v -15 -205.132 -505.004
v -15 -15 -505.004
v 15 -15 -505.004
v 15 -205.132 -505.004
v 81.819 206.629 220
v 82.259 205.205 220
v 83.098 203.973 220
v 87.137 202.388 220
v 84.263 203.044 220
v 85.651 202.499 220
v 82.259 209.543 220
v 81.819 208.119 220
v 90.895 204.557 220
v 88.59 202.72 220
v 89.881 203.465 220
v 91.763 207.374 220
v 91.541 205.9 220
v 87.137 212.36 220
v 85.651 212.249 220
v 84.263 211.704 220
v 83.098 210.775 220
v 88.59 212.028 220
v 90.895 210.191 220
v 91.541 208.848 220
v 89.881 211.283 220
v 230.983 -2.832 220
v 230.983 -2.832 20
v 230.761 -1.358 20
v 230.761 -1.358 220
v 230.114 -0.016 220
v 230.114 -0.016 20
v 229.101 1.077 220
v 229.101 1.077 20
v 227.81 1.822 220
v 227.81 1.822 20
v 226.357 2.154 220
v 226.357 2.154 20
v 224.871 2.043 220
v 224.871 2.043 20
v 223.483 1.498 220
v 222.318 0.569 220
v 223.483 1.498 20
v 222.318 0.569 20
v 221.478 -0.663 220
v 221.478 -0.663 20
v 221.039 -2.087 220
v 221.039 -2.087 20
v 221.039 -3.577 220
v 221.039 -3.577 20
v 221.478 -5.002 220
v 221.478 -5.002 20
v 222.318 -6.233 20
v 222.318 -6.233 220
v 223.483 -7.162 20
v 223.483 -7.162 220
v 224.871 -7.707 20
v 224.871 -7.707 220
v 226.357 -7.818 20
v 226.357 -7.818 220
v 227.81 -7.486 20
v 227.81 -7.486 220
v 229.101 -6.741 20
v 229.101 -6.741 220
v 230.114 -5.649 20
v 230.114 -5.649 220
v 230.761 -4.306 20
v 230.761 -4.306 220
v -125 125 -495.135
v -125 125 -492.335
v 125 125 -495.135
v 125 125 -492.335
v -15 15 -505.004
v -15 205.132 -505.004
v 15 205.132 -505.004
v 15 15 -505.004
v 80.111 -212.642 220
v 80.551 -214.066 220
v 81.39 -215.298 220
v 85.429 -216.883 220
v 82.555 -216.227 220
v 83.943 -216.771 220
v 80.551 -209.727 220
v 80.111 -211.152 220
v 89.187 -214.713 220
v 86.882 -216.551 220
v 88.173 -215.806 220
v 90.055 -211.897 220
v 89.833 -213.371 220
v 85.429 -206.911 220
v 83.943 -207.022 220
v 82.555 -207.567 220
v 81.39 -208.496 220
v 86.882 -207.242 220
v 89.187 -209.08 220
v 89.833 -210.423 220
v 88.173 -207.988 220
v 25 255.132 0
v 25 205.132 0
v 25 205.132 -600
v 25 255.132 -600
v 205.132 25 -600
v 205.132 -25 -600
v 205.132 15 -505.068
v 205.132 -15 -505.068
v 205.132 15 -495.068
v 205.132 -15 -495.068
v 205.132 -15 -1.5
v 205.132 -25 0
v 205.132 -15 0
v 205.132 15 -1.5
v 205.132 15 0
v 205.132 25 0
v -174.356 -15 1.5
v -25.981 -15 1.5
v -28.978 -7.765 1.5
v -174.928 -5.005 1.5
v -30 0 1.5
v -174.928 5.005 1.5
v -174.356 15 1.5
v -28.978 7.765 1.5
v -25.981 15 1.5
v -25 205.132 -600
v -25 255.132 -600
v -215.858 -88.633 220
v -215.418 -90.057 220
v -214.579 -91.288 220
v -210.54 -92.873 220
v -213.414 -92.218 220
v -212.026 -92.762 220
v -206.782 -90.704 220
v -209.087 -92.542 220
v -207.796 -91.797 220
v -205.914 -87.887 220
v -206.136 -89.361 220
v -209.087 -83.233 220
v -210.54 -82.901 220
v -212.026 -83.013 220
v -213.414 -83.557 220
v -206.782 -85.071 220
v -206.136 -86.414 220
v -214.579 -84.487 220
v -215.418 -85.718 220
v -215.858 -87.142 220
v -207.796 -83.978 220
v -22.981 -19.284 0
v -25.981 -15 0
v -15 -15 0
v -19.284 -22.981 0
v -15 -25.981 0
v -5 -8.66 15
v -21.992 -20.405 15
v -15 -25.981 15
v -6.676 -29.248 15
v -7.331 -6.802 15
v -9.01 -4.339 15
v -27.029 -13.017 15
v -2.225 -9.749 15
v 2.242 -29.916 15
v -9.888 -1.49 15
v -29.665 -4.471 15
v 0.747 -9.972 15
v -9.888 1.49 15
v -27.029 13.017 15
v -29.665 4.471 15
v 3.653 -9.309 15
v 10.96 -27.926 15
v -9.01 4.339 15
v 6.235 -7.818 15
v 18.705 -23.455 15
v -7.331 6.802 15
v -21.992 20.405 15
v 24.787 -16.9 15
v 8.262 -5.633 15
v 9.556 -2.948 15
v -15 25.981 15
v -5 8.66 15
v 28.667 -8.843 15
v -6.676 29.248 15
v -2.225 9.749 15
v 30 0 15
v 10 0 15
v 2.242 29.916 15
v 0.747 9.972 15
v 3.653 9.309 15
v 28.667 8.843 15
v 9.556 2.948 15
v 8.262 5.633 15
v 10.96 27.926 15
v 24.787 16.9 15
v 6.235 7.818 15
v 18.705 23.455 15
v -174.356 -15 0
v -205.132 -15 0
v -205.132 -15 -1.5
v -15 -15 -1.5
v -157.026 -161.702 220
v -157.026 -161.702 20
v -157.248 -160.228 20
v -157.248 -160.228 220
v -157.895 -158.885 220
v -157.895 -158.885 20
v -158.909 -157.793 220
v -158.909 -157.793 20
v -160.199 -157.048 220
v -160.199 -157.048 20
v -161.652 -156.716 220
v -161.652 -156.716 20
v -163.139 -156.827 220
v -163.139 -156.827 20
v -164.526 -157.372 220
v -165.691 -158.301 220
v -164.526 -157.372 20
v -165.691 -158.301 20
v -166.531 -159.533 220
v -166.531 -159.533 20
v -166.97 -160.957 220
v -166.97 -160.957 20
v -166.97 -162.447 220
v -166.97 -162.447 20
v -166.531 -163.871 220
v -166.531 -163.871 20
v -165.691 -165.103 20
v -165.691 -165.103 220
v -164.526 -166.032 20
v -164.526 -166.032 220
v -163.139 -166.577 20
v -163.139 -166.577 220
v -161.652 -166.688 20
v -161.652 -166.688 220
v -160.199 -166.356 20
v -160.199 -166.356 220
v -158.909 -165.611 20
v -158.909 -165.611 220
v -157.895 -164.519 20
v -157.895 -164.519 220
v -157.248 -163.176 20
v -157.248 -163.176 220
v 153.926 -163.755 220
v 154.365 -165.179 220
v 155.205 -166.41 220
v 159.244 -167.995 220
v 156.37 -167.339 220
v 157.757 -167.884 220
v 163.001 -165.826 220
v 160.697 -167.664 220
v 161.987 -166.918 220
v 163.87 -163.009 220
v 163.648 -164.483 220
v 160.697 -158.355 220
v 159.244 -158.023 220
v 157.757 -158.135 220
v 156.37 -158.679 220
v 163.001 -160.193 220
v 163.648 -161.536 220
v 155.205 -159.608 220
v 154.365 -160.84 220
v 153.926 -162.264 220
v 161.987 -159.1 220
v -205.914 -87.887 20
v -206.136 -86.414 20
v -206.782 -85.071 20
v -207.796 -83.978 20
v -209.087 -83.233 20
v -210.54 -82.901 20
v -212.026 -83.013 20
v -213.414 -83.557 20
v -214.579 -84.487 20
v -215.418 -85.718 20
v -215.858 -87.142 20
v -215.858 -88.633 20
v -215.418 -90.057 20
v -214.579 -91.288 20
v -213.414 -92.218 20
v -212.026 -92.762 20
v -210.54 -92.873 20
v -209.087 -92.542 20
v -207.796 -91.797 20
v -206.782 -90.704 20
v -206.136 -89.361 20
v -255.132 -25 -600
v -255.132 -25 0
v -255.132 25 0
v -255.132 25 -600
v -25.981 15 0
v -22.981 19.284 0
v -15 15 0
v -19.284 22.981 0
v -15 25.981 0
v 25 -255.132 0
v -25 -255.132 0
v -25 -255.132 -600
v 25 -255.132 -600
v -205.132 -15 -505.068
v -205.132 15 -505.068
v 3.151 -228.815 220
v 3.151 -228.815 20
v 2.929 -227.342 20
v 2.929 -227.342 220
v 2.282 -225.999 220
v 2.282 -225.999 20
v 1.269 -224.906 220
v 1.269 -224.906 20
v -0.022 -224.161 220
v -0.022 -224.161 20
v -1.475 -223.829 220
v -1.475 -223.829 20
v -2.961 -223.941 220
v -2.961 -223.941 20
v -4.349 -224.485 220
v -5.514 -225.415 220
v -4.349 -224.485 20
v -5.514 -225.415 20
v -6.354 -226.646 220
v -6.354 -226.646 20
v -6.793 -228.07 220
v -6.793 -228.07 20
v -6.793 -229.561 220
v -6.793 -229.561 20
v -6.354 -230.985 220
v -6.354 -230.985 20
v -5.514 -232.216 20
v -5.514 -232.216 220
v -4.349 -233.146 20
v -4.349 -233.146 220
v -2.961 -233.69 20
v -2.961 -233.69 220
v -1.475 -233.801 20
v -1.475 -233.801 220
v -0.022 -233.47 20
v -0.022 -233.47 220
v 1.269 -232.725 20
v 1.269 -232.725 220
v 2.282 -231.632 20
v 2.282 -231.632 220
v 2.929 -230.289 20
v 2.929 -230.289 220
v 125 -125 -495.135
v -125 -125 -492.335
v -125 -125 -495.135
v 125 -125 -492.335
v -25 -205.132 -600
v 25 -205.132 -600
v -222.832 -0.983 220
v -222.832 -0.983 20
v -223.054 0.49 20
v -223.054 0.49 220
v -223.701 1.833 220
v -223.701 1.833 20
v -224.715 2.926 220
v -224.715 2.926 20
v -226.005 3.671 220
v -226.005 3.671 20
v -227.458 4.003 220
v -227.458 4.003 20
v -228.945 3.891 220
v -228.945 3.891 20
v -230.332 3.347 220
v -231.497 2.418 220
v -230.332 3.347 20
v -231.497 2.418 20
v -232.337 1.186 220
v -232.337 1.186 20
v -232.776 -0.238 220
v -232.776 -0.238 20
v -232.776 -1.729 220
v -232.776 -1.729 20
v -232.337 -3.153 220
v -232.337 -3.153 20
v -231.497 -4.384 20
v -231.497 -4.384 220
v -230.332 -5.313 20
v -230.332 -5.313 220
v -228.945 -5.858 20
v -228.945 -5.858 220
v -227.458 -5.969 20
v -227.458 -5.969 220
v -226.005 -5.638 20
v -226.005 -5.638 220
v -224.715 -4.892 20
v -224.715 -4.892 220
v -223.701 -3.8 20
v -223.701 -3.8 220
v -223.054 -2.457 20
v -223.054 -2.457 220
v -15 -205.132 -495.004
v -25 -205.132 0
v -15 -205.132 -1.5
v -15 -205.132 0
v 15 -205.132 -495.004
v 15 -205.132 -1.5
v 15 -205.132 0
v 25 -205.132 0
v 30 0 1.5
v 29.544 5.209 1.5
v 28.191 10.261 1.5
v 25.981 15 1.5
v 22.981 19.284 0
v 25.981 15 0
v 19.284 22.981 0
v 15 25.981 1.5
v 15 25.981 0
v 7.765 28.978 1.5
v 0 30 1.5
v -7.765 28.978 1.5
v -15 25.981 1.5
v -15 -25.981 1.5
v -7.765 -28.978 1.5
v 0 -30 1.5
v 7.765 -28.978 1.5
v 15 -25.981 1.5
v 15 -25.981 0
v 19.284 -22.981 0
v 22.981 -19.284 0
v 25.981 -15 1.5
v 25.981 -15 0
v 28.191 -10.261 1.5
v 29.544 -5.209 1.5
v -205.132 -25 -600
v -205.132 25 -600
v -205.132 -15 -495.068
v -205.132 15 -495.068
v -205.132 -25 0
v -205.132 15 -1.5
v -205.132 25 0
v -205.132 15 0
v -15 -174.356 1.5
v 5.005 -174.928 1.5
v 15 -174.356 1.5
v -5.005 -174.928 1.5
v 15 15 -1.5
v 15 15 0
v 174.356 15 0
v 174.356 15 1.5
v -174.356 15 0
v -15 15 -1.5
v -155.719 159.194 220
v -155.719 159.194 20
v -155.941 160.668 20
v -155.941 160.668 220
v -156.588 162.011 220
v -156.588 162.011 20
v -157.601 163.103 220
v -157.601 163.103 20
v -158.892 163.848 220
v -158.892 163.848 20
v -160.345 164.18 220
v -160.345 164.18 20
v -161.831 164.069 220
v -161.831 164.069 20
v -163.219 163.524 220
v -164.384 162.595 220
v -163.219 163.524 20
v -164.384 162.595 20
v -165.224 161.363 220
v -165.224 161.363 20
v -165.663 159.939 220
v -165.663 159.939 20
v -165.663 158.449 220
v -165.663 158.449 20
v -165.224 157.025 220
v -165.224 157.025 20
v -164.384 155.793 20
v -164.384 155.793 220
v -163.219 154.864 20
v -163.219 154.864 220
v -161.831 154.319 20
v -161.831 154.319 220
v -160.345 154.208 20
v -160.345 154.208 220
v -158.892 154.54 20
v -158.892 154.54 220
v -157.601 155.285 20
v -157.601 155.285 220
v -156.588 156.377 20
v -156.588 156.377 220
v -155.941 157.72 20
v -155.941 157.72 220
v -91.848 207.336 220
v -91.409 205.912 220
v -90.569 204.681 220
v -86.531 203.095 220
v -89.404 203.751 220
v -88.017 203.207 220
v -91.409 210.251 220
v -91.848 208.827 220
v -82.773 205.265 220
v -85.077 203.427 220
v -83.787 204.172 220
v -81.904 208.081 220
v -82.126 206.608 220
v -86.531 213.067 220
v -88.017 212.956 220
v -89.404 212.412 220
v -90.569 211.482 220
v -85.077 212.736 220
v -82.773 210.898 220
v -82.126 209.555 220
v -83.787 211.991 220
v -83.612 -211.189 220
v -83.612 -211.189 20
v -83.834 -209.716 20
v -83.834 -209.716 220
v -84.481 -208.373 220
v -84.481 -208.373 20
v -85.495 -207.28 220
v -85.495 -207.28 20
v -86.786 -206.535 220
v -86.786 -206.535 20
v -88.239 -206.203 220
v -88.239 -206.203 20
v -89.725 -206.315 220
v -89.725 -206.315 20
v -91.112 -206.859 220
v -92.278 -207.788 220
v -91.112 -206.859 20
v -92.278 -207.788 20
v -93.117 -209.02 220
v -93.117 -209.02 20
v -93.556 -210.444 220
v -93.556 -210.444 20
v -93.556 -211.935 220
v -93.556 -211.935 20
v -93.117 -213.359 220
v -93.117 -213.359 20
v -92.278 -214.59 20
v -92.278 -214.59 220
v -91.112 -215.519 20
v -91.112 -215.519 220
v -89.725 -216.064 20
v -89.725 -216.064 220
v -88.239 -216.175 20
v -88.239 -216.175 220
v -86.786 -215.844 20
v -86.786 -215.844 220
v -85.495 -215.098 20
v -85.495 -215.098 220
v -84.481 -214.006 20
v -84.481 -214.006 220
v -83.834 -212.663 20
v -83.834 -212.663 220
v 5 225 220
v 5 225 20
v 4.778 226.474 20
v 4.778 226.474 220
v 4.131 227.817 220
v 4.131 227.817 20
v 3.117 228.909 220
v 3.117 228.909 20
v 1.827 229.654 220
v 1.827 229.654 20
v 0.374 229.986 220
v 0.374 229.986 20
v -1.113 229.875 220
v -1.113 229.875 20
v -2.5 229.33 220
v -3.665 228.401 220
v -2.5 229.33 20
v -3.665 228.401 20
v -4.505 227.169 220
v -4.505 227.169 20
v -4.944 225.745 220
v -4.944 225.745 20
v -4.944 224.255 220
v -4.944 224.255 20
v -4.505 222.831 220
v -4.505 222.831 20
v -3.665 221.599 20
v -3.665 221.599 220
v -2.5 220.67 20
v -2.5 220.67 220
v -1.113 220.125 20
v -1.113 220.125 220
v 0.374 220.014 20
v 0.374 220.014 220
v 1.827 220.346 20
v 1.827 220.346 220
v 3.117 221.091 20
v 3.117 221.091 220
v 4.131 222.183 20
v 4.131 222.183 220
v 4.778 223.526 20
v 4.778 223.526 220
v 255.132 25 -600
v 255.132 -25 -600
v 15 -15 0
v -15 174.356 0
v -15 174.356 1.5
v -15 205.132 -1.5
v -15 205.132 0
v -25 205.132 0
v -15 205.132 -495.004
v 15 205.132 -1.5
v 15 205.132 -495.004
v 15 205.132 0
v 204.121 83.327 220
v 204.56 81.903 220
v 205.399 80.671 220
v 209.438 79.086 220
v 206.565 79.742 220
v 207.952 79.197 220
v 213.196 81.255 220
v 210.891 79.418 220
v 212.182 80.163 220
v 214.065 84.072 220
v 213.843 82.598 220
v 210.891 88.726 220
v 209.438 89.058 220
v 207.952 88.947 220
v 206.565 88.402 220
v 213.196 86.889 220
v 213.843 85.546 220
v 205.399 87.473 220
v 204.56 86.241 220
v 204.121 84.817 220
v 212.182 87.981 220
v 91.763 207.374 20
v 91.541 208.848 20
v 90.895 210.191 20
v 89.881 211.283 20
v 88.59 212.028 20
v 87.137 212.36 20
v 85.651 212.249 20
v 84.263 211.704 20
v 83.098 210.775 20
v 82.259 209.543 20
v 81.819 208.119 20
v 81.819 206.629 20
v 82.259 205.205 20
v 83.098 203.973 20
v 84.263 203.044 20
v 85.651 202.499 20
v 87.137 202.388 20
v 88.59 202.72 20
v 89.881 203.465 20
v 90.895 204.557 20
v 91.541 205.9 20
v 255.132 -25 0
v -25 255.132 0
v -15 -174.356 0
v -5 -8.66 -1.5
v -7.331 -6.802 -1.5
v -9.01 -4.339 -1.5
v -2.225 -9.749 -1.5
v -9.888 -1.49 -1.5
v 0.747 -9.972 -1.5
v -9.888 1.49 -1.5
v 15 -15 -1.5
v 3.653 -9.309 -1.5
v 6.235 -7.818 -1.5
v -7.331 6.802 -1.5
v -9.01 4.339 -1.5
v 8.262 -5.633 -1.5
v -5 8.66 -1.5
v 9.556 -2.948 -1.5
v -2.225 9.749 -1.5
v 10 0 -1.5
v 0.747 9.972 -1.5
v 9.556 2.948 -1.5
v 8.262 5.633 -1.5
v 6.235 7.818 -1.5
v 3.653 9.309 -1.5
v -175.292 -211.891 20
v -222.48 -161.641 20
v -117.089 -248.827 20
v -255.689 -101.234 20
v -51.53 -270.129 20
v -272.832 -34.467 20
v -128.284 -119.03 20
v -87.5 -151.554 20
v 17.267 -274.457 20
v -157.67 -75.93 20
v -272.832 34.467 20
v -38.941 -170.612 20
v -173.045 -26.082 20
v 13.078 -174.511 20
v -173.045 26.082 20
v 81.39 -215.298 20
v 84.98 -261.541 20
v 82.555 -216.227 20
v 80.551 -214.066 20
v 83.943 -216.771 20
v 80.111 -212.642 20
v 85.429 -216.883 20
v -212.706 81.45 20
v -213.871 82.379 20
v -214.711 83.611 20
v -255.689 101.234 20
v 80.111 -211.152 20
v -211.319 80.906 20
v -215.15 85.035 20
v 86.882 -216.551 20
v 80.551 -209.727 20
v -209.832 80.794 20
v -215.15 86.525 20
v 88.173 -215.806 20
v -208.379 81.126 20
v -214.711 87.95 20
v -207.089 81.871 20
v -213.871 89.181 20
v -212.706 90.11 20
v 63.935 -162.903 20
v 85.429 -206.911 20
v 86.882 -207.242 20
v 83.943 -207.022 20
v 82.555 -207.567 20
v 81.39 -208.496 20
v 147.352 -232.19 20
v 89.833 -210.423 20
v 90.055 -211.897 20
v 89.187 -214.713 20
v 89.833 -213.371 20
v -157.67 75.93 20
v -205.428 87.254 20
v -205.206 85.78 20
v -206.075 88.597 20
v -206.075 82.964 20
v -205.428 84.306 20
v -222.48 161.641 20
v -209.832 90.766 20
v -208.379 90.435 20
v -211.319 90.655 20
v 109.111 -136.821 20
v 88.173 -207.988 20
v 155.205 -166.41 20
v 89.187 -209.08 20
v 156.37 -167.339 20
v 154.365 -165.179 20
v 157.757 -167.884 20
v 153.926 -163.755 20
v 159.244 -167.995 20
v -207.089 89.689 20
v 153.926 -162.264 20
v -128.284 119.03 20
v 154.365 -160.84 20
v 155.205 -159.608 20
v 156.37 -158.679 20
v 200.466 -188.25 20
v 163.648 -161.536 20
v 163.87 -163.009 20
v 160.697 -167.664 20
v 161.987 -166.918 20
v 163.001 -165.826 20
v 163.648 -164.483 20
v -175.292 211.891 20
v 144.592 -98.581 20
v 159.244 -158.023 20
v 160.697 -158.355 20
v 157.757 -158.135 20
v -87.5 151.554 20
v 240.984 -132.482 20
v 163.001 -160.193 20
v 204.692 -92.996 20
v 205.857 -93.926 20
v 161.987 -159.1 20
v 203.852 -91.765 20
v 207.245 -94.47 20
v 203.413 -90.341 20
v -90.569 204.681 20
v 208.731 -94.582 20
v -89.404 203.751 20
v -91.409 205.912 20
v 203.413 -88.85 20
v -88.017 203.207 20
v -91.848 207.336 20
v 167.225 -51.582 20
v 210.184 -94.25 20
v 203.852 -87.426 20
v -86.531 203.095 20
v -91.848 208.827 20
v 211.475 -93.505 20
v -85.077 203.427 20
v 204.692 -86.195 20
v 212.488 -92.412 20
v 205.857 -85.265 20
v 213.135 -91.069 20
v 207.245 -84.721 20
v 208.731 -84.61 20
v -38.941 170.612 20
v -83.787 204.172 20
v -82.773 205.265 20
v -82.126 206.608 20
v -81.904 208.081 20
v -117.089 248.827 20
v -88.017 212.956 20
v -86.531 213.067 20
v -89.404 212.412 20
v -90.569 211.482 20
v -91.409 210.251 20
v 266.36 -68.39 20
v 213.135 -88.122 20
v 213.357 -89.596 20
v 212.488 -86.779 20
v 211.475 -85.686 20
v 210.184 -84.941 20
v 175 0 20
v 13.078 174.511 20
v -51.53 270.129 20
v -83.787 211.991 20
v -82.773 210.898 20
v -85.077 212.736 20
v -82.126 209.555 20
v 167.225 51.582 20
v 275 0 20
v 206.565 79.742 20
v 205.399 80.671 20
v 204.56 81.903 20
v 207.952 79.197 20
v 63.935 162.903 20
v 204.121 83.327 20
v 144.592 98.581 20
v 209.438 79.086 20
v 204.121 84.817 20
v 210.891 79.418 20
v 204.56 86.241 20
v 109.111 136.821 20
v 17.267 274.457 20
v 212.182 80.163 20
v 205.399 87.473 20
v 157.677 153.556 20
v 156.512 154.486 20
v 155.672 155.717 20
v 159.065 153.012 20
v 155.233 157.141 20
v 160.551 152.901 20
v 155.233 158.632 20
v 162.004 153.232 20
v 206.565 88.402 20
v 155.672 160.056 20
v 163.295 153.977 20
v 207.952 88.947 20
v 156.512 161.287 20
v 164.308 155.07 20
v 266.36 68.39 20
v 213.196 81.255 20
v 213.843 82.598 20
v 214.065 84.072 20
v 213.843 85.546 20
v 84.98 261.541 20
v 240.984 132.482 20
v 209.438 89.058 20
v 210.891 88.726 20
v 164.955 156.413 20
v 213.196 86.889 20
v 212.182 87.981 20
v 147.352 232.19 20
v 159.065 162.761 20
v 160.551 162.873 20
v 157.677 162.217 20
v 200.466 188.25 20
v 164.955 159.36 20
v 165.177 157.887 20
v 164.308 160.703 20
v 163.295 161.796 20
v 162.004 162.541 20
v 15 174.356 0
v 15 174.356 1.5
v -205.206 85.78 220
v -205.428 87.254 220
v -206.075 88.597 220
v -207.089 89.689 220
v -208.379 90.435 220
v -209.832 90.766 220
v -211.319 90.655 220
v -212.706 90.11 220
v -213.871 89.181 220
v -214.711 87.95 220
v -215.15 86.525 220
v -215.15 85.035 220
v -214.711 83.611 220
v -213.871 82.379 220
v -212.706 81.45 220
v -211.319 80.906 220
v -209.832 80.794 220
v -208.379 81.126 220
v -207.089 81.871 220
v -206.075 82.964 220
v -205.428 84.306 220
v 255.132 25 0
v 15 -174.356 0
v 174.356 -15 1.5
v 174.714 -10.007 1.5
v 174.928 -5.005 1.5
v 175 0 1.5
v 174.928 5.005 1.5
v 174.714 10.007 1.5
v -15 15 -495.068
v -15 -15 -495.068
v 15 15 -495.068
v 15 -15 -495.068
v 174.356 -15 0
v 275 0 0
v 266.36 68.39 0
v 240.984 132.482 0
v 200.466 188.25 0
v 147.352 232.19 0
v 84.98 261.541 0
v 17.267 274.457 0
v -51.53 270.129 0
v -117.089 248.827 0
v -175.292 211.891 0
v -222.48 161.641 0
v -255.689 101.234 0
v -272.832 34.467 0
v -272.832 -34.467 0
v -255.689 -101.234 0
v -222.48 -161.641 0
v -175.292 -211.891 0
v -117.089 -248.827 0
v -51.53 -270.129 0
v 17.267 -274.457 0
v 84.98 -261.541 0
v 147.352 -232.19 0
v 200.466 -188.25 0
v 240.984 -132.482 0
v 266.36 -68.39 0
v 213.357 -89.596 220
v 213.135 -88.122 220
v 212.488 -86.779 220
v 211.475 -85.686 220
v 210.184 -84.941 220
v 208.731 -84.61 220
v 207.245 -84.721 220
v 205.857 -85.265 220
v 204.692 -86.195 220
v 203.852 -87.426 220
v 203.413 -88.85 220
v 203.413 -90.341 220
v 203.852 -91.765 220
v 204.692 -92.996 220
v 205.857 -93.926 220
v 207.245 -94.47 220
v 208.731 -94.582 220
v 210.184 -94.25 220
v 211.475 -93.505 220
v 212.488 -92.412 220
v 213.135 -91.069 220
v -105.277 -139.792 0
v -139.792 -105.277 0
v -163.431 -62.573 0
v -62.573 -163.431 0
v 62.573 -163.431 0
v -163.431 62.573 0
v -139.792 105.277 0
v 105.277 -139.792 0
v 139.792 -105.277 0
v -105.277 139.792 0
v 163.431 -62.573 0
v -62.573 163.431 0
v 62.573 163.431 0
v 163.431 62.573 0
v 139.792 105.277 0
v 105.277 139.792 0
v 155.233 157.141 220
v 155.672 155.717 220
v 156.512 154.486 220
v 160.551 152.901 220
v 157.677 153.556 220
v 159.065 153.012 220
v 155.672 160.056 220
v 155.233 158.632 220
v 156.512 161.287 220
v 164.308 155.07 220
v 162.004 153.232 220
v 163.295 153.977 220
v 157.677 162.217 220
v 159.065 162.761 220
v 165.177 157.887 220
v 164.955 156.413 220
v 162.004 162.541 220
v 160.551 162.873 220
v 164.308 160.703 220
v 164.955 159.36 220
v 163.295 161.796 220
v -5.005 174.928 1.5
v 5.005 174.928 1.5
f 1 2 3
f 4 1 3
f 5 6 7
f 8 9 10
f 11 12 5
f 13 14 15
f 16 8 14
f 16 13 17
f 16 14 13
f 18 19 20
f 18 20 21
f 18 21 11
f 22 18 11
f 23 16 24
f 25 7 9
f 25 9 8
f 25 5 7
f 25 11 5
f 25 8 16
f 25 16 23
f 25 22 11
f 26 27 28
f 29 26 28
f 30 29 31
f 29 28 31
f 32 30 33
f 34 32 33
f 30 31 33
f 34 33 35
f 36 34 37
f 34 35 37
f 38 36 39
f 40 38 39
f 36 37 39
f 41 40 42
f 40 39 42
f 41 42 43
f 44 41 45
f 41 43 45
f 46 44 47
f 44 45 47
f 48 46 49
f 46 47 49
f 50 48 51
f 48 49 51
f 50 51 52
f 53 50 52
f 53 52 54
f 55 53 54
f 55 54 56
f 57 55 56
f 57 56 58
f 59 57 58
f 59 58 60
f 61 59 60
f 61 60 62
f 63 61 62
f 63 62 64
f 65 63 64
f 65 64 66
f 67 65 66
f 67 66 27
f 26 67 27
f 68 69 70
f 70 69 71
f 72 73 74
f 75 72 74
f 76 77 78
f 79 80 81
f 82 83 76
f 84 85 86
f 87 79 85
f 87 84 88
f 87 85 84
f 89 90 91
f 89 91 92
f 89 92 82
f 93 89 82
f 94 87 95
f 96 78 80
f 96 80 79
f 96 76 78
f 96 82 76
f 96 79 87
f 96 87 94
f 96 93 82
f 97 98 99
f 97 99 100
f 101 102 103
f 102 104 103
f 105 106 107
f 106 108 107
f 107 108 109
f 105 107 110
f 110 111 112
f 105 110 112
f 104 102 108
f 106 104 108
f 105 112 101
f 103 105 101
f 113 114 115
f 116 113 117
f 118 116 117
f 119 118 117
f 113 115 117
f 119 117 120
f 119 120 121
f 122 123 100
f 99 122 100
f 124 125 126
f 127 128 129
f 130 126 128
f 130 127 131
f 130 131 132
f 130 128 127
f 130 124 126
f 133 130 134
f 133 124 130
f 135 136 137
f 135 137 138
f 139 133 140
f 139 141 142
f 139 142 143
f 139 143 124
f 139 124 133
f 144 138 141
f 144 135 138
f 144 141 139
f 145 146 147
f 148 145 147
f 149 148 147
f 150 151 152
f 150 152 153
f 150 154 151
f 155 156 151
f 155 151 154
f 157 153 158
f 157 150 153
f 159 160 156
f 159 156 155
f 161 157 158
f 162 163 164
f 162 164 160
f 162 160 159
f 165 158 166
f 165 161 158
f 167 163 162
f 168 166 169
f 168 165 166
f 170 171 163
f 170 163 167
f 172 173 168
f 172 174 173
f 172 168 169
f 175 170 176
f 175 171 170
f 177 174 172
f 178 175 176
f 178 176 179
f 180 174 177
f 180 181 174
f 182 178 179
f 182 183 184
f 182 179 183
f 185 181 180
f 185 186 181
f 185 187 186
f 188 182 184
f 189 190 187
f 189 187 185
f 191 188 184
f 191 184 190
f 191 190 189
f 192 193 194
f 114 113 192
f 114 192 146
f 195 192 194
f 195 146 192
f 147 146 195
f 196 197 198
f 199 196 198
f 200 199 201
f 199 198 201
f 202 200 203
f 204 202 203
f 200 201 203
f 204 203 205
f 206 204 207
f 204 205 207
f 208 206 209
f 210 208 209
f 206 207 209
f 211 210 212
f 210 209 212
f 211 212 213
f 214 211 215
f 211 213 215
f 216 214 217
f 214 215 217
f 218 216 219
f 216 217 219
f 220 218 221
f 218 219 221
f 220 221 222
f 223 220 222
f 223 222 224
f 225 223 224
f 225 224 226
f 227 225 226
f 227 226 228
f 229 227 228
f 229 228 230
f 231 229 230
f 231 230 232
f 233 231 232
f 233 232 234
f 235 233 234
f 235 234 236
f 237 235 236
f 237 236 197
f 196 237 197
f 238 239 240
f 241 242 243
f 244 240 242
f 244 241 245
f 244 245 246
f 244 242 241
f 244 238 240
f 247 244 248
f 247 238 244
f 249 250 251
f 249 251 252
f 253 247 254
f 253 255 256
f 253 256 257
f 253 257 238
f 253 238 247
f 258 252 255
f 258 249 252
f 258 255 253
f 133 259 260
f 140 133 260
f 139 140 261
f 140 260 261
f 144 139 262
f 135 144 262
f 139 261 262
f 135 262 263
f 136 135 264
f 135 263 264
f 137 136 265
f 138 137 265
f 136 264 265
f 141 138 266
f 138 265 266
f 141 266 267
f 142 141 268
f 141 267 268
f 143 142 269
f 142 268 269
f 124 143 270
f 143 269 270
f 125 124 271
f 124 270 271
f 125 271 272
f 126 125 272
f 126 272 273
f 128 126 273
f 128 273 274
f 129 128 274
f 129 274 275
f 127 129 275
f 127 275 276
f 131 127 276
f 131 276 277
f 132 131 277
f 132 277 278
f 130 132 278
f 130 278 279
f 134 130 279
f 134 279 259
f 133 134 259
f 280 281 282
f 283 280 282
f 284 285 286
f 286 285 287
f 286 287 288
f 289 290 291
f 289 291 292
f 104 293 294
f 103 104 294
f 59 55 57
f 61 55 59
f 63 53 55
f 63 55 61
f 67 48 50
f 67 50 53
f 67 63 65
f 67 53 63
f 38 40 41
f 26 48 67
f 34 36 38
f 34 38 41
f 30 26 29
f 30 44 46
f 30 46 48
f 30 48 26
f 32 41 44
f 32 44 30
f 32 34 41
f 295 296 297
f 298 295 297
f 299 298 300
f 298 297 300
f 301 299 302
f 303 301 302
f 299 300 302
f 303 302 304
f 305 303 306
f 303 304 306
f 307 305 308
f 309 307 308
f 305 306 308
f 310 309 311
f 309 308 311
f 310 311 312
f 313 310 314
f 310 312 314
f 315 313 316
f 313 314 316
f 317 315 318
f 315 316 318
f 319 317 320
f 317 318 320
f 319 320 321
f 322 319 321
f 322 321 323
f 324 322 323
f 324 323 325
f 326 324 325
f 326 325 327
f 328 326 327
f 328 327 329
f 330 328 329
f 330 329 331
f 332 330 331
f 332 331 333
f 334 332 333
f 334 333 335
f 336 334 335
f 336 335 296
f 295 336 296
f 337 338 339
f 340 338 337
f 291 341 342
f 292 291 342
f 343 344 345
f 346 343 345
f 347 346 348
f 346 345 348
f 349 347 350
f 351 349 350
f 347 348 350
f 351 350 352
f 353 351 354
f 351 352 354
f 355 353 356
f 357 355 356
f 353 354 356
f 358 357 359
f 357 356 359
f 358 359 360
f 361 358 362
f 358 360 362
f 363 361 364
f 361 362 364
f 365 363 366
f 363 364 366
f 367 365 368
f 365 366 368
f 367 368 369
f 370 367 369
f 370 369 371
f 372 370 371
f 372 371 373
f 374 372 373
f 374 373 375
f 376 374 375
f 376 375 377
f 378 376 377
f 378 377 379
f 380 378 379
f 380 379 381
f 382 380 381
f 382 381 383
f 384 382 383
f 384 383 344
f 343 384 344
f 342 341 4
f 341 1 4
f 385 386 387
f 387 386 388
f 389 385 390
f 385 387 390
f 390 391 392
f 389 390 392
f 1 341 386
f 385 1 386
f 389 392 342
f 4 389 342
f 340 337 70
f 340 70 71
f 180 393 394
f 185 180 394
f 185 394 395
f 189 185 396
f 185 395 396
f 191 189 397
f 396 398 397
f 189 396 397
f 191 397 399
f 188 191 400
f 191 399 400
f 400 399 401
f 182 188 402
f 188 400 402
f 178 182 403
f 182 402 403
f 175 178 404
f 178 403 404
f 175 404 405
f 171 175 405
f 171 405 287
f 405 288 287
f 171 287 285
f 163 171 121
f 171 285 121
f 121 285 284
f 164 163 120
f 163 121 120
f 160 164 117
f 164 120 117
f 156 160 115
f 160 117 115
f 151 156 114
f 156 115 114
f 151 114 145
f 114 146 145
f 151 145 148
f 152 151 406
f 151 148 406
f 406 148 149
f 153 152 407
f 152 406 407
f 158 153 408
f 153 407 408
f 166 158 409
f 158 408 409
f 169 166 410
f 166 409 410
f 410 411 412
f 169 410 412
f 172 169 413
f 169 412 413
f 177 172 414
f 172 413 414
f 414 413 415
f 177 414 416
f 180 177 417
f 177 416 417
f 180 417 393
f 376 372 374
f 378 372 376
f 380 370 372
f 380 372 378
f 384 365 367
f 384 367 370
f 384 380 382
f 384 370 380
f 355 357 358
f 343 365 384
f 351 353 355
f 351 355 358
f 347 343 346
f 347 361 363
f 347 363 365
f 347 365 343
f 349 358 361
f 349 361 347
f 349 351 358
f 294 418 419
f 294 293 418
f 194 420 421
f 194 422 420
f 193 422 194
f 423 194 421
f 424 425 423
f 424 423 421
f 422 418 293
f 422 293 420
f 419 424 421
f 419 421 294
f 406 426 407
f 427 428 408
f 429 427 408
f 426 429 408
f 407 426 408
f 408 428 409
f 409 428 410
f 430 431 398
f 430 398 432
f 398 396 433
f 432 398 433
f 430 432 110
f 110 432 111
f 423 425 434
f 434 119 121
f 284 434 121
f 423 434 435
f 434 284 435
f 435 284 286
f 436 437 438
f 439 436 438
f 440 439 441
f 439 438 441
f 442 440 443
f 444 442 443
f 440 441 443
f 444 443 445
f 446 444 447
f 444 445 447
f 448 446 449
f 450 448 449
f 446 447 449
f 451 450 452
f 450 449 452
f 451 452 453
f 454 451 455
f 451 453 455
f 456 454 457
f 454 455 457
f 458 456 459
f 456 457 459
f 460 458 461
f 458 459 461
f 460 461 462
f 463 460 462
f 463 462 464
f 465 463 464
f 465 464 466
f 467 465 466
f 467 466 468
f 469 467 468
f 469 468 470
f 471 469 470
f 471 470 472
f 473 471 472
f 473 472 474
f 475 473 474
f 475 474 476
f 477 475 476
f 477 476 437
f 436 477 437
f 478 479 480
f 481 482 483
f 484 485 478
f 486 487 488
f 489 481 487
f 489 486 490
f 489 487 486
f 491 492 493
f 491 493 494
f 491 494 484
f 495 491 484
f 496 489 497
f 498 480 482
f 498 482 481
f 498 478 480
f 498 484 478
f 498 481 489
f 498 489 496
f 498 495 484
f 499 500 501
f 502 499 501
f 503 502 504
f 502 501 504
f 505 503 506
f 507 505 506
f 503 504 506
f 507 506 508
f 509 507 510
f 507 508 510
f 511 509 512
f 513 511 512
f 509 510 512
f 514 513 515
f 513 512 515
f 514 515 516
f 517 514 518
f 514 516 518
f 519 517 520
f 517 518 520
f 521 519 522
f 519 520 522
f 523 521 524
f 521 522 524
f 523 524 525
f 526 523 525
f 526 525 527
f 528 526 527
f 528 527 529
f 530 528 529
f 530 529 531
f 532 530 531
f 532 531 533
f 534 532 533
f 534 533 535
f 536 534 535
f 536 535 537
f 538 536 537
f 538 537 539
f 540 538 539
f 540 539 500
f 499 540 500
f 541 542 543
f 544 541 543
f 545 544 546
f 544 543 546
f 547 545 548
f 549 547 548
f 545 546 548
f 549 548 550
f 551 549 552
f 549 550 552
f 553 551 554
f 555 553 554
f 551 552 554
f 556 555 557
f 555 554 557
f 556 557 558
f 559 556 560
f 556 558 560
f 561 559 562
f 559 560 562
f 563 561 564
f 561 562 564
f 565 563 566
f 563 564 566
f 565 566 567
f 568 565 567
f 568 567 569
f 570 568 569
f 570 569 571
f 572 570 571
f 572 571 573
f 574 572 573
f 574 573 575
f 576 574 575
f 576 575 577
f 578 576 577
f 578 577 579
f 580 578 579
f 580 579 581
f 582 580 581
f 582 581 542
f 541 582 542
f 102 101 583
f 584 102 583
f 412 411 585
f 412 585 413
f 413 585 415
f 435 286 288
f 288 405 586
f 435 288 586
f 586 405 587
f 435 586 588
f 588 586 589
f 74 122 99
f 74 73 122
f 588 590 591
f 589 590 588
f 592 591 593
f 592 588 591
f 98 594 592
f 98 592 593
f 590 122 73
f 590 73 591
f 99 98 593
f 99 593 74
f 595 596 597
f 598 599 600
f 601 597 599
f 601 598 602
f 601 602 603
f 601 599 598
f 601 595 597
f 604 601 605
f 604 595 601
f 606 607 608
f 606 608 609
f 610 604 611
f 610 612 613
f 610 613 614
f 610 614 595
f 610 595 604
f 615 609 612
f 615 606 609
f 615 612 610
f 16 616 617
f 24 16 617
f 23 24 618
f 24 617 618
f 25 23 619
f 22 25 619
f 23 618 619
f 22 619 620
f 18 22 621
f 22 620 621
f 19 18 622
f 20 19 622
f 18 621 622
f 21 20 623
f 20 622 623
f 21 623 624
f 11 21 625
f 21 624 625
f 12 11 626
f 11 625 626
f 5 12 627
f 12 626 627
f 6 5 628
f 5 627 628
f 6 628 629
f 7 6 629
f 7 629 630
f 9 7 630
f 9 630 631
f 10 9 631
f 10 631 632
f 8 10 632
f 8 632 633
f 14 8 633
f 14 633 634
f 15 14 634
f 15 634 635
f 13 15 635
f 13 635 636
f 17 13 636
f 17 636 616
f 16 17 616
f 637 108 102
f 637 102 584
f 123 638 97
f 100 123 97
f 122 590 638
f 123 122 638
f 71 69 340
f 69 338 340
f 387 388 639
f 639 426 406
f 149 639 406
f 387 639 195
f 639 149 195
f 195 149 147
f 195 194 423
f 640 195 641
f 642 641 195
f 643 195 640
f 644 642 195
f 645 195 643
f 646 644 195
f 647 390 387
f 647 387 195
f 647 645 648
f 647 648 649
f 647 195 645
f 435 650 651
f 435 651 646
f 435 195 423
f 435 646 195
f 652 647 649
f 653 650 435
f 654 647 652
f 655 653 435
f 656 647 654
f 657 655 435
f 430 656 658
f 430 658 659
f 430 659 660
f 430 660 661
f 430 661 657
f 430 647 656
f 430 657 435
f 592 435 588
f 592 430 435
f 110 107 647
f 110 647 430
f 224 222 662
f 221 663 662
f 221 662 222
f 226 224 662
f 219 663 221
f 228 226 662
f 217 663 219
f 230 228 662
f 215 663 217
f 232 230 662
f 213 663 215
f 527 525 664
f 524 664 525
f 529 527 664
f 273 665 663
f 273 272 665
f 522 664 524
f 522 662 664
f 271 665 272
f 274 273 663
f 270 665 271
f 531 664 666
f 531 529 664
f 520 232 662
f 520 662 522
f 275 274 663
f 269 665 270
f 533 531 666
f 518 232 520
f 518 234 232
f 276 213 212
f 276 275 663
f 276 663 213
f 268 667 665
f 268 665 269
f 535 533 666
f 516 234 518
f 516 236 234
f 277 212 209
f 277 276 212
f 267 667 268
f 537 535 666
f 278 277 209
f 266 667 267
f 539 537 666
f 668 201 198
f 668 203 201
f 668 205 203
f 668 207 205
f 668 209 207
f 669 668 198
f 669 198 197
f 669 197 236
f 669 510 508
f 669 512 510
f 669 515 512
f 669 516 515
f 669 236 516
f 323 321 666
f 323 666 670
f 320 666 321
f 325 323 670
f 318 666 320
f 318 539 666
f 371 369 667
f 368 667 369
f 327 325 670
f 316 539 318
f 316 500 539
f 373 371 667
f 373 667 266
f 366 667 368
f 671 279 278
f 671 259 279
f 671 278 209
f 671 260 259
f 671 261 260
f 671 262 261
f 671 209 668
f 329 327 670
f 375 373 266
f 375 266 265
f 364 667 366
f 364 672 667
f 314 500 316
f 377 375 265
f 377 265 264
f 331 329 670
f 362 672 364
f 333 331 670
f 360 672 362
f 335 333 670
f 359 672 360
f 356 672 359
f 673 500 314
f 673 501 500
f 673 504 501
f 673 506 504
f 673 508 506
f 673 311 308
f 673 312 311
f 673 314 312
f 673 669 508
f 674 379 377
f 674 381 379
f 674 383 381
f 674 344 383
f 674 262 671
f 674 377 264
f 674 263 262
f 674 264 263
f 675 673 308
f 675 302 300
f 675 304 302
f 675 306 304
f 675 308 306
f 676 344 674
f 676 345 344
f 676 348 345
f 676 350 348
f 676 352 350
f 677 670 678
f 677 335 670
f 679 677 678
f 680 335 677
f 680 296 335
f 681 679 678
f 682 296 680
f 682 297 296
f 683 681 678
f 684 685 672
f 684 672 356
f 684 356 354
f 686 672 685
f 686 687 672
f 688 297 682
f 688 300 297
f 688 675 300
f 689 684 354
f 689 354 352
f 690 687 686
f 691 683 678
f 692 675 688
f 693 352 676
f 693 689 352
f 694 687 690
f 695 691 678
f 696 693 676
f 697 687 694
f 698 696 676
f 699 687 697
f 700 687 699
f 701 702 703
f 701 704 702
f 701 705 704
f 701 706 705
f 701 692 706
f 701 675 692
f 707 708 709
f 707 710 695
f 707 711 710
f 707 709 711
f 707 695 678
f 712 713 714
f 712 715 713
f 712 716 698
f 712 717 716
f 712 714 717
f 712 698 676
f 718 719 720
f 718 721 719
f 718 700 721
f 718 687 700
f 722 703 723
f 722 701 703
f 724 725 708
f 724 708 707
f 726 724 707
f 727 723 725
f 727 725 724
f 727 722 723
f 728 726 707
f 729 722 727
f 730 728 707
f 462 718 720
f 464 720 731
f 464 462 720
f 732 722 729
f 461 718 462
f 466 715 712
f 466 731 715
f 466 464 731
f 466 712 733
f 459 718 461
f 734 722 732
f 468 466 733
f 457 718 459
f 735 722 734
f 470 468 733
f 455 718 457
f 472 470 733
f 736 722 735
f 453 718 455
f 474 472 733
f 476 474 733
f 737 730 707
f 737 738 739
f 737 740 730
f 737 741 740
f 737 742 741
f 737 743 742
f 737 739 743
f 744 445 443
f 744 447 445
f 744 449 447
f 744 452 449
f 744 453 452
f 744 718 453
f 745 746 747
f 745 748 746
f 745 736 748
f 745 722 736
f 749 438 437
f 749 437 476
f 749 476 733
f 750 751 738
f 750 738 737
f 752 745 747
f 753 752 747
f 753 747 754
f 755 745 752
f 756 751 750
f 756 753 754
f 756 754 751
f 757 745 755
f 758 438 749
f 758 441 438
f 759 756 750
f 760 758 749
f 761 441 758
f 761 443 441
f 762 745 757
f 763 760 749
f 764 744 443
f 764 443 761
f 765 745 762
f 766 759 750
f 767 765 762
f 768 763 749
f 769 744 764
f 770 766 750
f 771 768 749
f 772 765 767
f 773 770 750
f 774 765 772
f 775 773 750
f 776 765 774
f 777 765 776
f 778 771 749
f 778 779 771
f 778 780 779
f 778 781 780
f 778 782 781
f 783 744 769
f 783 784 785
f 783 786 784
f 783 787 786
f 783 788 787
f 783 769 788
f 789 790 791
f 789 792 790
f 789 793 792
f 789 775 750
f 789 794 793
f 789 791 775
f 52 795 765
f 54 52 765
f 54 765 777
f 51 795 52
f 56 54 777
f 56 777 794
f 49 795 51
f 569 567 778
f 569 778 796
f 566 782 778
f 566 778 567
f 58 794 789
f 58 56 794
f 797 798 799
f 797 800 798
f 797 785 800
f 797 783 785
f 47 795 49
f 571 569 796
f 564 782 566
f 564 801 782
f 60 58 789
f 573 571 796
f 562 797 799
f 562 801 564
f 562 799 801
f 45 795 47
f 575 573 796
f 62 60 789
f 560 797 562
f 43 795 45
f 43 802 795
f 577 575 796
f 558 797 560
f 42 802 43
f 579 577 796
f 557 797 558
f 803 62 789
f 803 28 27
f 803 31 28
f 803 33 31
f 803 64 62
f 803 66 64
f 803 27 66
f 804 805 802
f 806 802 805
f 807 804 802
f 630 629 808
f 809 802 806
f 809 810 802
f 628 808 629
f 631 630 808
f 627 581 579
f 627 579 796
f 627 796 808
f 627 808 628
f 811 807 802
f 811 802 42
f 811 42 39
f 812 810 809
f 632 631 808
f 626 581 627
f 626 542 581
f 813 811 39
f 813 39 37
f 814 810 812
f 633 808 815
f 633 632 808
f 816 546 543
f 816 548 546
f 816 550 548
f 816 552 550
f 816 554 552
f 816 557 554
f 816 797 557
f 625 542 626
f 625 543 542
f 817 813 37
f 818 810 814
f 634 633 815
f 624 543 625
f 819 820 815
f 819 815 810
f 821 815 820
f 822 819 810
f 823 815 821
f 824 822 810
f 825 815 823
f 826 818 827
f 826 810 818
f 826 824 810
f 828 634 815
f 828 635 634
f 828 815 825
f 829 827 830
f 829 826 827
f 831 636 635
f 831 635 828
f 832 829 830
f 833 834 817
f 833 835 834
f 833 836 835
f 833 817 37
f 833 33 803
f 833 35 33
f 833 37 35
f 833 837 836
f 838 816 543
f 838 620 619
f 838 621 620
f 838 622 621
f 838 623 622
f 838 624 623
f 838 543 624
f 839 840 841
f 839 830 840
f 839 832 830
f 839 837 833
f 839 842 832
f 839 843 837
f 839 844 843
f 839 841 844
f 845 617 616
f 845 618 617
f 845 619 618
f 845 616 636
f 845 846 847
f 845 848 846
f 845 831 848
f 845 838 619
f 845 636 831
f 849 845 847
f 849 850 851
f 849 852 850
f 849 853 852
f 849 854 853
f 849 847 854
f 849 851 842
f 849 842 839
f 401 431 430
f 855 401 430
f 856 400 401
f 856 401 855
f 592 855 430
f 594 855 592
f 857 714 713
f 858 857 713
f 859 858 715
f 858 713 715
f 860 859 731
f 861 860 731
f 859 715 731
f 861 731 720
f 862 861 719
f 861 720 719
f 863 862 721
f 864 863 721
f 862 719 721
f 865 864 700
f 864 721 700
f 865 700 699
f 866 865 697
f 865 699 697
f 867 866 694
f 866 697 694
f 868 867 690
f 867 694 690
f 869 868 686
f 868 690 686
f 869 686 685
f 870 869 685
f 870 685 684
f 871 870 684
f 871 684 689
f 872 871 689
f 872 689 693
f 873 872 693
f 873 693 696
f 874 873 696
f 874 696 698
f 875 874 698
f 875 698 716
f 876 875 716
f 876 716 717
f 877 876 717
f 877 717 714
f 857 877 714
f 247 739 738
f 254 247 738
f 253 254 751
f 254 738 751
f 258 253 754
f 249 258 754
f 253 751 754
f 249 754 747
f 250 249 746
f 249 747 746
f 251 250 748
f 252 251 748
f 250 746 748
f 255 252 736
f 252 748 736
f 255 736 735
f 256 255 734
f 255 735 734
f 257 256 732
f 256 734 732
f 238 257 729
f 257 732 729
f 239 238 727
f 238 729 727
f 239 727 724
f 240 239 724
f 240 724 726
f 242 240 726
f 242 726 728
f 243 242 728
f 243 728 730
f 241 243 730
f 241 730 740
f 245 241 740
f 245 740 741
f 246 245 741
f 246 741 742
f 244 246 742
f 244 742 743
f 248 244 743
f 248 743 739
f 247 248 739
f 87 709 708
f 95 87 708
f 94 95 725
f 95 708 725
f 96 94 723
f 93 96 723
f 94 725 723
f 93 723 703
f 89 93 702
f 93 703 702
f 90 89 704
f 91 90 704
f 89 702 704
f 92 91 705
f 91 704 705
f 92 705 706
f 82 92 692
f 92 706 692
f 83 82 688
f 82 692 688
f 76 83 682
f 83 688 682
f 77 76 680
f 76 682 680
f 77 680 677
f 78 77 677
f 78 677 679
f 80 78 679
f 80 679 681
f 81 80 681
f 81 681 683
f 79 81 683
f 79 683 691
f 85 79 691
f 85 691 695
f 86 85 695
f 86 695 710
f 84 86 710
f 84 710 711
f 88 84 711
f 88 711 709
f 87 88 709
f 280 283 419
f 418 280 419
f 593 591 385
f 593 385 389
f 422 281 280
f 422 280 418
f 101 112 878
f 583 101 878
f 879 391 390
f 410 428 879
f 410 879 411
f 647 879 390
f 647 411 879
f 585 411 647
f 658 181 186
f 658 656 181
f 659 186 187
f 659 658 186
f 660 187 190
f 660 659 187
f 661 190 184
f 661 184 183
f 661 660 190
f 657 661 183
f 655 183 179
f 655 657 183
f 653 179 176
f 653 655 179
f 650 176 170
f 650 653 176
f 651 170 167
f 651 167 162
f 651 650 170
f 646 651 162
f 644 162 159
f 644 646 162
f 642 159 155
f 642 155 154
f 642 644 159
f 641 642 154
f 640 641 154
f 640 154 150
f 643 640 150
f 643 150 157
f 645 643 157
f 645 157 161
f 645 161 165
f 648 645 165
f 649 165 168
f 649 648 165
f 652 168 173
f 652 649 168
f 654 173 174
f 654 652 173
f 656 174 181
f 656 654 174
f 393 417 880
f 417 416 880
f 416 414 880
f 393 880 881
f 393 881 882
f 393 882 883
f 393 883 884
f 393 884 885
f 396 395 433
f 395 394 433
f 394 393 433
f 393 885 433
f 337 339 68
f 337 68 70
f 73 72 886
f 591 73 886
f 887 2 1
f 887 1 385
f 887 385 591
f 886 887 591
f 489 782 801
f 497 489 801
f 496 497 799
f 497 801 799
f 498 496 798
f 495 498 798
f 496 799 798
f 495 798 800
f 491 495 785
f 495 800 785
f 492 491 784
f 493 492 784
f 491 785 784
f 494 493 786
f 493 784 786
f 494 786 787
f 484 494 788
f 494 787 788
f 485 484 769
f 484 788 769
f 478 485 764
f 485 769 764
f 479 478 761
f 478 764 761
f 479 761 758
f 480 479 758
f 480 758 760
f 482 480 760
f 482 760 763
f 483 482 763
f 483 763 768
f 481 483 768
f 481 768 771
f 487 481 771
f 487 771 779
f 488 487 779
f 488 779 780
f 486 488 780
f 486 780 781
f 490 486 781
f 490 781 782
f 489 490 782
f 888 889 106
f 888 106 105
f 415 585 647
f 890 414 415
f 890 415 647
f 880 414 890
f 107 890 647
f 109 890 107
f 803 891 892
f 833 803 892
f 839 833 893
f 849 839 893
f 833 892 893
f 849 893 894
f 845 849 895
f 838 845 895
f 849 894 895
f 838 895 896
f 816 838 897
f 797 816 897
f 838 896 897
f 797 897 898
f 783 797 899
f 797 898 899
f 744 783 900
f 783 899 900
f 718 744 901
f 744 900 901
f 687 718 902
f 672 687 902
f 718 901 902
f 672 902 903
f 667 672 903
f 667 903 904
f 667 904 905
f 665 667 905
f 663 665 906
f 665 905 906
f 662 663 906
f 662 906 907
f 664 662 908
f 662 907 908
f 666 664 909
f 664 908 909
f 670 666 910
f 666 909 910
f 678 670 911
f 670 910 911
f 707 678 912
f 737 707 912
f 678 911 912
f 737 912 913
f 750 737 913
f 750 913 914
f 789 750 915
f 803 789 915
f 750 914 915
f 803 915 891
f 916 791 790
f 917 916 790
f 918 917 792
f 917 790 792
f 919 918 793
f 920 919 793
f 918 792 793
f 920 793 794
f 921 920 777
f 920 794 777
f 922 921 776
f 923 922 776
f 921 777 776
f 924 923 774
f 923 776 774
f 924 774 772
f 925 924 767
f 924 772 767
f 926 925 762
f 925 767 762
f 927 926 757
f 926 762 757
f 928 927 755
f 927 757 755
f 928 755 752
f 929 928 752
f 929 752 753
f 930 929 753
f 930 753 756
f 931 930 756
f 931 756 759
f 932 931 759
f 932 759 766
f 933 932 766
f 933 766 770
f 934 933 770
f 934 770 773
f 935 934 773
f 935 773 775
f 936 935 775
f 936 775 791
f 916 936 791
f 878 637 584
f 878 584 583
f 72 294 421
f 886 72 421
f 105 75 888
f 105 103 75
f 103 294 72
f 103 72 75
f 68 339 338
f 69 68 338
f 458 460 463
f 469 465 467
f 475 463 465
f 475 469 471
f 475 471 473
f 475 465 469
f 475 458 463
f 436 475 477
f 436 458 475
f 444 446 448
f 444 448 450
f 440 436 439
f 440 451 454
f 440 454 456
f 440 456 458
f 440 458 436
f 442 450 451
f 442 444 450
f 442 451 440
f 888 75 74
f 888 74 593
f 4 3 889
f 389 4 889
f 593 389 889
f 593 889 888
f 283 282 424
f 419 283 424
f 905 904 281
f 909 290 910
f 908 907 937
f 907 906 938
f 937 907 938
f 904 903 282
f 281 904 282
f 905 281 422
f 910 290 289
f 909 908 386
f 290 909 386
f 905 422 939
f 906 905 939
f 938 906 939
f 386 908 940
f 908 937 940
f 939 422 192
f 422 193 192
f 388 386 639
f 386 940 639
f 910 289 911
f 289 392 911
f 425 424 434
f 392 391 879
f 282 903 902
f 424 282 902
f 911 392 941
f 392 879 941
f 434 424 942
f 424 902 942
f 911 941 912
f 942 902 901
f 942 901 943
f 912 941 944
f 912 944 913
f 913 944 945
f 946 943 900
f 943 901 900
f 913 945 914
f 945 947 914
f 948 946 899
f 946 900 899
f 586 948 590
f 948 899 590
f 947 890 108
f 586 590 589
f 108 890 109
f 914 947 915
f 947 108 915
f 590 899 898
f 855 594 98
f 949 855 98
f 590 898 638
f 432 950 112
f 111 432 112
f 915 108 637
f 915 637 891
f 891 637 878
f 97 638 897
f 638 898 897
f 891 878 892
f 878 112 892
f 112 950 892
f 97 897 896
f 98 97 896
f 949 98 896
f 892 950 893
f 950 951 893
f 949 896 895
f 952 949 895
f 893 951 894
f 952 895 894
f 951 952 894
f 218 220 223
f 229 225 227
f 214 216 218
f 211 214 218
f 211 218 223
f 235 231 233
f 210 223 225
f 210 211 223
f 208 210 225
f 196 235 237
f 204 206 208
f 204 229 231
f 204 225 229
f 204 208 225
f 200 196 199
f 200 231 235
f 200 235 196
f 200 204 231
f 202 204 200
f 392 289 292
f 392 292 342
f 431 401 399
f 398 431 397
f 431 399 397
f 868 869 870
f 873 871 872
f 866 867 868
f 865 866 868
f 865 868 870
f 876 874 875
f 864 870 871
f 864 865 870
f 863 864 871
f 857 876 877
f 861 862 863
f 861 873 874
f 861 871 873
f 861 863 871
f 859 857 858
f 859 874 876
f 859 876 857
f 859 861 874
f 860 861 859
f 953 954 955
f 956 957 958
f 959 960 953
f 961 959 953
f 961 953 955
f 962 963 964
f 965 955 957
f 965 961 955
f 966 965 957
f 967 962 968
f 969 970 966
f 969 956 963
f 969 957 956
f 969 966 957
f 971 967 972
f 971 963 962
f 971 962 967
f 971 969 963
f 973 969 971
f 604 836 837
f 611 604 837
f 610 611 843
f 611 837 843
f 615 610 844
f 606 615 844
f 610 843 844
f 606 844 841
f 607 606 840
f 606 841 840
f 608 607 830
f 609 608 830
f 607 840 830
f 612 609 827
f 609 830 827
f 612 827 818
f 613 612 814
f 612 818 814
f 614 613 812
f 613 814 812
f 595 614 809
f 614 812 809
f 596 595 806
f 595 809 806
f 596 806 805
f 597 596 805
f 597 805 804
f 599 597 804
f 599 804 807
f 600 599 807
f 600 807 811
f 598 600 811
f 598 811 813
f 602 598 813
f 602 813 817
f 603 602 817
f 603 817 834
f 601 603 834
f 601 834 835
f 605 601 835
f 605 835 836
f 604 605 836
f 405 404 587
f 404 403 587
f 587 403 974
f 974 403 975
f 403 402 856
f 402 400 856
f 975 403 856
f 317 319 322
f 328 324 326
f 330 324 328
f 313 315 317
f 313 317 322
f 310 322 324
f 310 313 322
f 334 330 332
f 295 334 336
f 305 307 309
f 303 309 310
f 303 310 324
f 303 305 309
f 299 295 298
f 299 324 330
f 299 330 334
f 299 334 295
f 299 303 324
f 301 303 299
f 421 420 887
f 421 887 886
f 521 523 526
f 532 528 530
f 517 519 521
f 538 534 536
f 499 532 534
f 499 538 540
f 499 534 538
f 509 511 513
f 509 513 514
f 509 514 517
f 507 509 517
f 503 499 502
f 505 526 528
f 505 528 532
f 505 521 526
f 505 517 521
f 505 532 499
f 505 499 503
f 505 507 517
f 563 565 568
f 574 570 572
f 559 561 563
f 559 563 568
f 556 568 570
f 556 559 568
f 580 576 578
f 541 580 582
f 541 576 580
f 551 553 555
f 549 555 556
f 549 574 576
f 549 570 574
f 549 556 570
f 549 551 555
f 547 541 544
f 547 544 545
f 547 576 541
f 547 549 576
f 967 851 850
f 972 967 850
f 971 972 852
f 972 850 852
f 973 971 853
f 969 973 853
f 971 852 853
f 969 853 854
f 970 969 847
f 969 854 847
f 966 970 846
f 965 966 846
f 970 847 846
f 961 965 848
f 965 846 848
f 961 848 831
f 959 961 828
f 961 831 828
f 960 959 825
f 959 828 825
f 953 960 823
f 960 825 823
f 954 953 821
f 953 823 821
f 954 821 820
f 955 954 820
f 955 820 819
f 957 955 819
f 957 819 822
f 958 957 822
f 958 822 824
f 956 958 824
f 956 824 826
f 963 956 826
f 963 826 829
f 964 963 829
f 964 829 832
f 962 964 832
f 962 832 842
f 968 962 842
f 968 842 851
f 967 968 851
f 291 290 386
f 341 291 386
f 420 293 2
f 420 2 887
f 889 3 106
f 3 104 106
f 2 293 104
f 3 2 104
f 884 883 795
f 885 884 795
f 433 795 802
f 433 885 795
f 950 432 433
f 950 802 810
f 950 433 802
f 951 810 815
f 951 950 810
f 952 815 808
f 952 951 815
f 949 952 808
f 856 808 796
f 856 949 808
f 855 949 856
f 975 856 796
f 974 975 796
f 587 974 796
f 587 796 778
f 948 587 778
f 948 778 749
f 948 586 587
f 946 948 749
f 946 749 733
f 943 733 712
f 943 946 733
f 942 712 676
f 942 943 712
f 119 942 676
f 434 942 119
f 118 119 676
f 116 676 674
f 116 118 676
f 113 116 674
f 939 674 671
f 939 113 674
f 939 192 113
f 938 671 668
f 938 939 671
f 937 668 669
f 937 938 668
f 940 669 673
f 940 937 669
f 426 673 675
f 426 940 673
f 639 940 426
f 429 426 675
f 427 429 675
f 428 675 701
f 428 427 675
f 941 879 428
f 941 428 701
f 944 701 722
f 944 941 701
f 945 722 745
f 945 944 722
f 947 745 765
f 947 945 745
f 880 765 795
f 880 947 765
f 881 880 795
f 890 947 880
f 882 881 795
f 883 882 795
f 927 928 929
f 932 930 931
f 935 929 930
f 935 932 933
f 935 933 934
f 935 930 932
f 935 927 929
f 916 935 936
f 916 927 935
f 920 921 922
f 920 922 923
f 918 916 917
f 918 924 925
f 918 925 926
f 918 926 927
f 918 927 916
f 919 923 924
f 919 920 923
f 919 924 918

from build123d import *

# Parameters (mm, degrees)
F0_R       = 5
F0_R_2     = 275
F0_R_3     = 175
F1_DEPTH   = 20
F2_DEPTH   = 220
F3_W       = 50
F3_H       = 50
F4_DEPTH   = 600
F5_W       = 30
F5_H       = 10
F6_DEPTH   = 220
F7_W       = 30
F7_H       = 10
F8_DEPTH   = 220
F9_W       = 250
F9_H       = 2.8
F10_DEPTH  = 125
F11_W      = 440
F11_H      = 3
F12_DEPTH  = 15
F13_W      = 440
F13_H      = 3
F14_DEPTH  = 15
F15_R      = 30
F15_R_2    = 10
F16_DEPTH  = 15
F16_FACE_R = 10
F17_DEPTH  = 125


with BuildPart() as f1:
    # F0 (on Top) → F1 (new body)
    with BuildSketch(Plane.XY):
        with Locations((85.055368, -211.896841)):
            Circle(F0_R)
        with Locations((-1.848817, -228.815405)):
            Circle(F0_R)
        with Locations((-88.612269, -211.189329)):
            Circle(F0_R)
        with Locations((-162.026039, -161.702022)):
            Circle(F0_R)
        with Locations((-210.913547, -87.887479)):
            Circle(F0_R)
        with Locations((-227.832111, -0.983294)):
            Circle(F0_R)
        with Locations((-210.206035, 85.780158)):
            Circle(F0_R)
        with Locations((-160.718728, 159.193928)):
            Circle(F0_R)
        with Locations((-86.904185, 208.081435)):
            Circle(F0_R)
        with Locations((0, 225)):
            Circle(F0_R)
        with Locations((86.763452, 207.373924)):
            Circle(F0_R)
        with Locations((160.177222, 157.886617)):
            Circle(F0_R)
        with Locations((209.06473, 84.072074)):
            Circle(F0_R)
        with Locations((225.983294, -2.832111)):
            Circle(F0_R)
        with Locations((208.357218, -89.595563)):
            Circle(F0_R)
        with Locations((158.869911, -163.009334)):
            Circle(F0_R)
        Circle(F0_R_2)
        with Locations((-162.026039, -161.702022)):
            Circle(F0_R, mode=Mode.SUBTRACT)
        with Locations((-88.612269, -211.189329)):
            Circle(F0_R, mode=Mode.SUBTRACT)
        with Locations((-1.848817, -228.815405)):
            Circle(F0_R, mode=Mode.SUBTRACT)
        with Locations((-210.913547, -87.887479)):
            Circle(F0_R, mode=Mode.SUBTRACT)
        with Locations((-227.832111, -0.983294)):
            Circle(F0_R, mode=Mode.SUBTRACT)
        with Locations((85.055368, -211.896841)):
            Circle(F0_R, mode=Mode.SUBTRACT)
        with Locations((158.869911, -163.009334)):
            Circle(F0_R, mode=Mode.SUBTRACT)
        with Locations((208.357218, -89.595563)):
            Circle(F0_R, mode=Mode.SUBTRACT)
        with Locations((225.983294, -2.832111)):
            Circle(F0_R, mode=Mode.SUBTRACT)
        with Locations((-210.206035, 85.780158)):
            Circle(F0_R, mode=Mode.SUBTRACT)
        with Locations((-160.718728, 159.193928)):
            Circle(F0_R, mode=Mode.SUBTRACT)
        with Locations((-86.904185, 208.081435)):
            Circle(F0_R, mode=Mode.SUBTRACT)
        Circle(F0_R_3, mode=Mode.SUBTRACT)
        with Locations((209.06473, 84.072074)):
            Circle(F0_R, mode=Mode.SUBTRACT)
        with Locations((0, 225)):
            Circle(F0_R, mode=Mode.SUBTRACT)
        with Locations((86.763452, 207.373924)):
            Circle(F0_R, mode=Mode.SUBTRACT)
        with Locations((160.177222, 157.886617)):
            Circle(F0_R, mode=Mode.SUBTRACT)
    extrude(amount=F1_DEPTH)

    # F0 (on Top) → F2 (join)
    with BuildSketch(Plane.XY):
        with Locations((-160.718728, 159.193928)):
            Circle(F0_R)
        with Locations((-210.206035, 85.780158)):
            Circle(F0_R)
        with Locations((-86.904185, 208.081435)):
            Circle(F0_R)
        with Locations((0, 225)):
            Circle(F0_R)
        with Locations((86.763452, 207.373924)):
            Circle(F0_R)
        with Locations((160.177222, 157.886617)):
            Circle(F0_R)
        with Locations((209.06473, 84.072074)):
            Circle(F0_R)
        with Locations((225.983294, -2.832111)):
            Circle(F0_R)
        with Locations((208.357218, -89.595563)):
            Circle(F0_R)
        with Locations((158.869911, -163.009334)):
            Circle(F0_R)
        with Locations((85.055368, -211.896841)):
            Circle(F0_R)
        with Locations((-88.612269, -211.189329)):
            Circle(F0_R)
        with Locations((-1.848817, -228.815405)):
            Circle(F0_R)
        with Locations((-162.026039, -161.702022)):
            Circle(F0_R)
        with Locations((-210.913547, -87.887479)):
            Circle(F0_R)
        with Locations((-227.832111, -0.983294)):
            Circle(F0_R)
    extrude(amount=F2_DEPTH)

    # F3 (on Top) → F4 (join)
    with BuildSketch(Plane.XY):
        with Locations((0, -230.131581)):
            Rectangle(F3_W, F3_H)
        with Locations((230.131581, 0)):
            Rectangle(F3_W, F3_H)
        with Locations((0, 230.131581)):
            Rectangle(F3_W, F3_H)
        with Locations((-230.131581, 0)):
            Rectangle(F3_W, F3_H)
    extrude(amount=-F4_DEPTH)

    # F5 (on Right) → F6 (join, symmetric)
    with BuildSketch(Plane.YZ):
        with Locations((0, -500.068092)):
            Rectangle(F5_W, F5_H)
    extrude(amount=F6_DEPTH, both=True)

    # F7 (on Front) → F8 (join, symmetric)
    with BuildSketch(Plane.XZ):
        with Locations((0, -500.003541)):
            Rectangle(F7_W, F7_H)
    extrude(amount=F8_DEPTH, both=True)

    # F11 (on Front) → F12 (join, symmetric)
    with BuildSketch(Plane.XZ):
        Rectangle(F11_W, F11_H)
    extrude(amount=F12_DEPTH, both=True)

    # F13 (on Right) → F14 (join, symmetric)
    with BuildSketch(Plane.YZ):
        Rectangle(F13_W, F13_H)
    extrude(amount=F14_DEPTH, both=True)

    # F15 (on Top) → F16 (join)
    with BuildSketch(Plane.XY):
        Circle(F15_R)
        Circle(F15_R_2, mode=Mode.SUBTRACT)
    extrude(amount=F16_DEPTH)

    # F16_face (on face) → F17 (cut, symmetric)
    with BuildSketch(Plane.XY.offset(1.5)):
        Circle(F16_FACE_R)
    extrude(amount=F17_DEPTH, both=True, mode=Mode.SUBTRACT)


with BuildPart() as f10:
    # F9 (on Front) → F10 (new body, symmetric)
    with BuildSketch(Plane.XZ):
        with Locations((0, -493.73531)):
            Rectangle(F9_W, F9_H)
    extrude(amount=F10_DEPTH, both=True)


solid = Compound([f1.part, f10.part])
